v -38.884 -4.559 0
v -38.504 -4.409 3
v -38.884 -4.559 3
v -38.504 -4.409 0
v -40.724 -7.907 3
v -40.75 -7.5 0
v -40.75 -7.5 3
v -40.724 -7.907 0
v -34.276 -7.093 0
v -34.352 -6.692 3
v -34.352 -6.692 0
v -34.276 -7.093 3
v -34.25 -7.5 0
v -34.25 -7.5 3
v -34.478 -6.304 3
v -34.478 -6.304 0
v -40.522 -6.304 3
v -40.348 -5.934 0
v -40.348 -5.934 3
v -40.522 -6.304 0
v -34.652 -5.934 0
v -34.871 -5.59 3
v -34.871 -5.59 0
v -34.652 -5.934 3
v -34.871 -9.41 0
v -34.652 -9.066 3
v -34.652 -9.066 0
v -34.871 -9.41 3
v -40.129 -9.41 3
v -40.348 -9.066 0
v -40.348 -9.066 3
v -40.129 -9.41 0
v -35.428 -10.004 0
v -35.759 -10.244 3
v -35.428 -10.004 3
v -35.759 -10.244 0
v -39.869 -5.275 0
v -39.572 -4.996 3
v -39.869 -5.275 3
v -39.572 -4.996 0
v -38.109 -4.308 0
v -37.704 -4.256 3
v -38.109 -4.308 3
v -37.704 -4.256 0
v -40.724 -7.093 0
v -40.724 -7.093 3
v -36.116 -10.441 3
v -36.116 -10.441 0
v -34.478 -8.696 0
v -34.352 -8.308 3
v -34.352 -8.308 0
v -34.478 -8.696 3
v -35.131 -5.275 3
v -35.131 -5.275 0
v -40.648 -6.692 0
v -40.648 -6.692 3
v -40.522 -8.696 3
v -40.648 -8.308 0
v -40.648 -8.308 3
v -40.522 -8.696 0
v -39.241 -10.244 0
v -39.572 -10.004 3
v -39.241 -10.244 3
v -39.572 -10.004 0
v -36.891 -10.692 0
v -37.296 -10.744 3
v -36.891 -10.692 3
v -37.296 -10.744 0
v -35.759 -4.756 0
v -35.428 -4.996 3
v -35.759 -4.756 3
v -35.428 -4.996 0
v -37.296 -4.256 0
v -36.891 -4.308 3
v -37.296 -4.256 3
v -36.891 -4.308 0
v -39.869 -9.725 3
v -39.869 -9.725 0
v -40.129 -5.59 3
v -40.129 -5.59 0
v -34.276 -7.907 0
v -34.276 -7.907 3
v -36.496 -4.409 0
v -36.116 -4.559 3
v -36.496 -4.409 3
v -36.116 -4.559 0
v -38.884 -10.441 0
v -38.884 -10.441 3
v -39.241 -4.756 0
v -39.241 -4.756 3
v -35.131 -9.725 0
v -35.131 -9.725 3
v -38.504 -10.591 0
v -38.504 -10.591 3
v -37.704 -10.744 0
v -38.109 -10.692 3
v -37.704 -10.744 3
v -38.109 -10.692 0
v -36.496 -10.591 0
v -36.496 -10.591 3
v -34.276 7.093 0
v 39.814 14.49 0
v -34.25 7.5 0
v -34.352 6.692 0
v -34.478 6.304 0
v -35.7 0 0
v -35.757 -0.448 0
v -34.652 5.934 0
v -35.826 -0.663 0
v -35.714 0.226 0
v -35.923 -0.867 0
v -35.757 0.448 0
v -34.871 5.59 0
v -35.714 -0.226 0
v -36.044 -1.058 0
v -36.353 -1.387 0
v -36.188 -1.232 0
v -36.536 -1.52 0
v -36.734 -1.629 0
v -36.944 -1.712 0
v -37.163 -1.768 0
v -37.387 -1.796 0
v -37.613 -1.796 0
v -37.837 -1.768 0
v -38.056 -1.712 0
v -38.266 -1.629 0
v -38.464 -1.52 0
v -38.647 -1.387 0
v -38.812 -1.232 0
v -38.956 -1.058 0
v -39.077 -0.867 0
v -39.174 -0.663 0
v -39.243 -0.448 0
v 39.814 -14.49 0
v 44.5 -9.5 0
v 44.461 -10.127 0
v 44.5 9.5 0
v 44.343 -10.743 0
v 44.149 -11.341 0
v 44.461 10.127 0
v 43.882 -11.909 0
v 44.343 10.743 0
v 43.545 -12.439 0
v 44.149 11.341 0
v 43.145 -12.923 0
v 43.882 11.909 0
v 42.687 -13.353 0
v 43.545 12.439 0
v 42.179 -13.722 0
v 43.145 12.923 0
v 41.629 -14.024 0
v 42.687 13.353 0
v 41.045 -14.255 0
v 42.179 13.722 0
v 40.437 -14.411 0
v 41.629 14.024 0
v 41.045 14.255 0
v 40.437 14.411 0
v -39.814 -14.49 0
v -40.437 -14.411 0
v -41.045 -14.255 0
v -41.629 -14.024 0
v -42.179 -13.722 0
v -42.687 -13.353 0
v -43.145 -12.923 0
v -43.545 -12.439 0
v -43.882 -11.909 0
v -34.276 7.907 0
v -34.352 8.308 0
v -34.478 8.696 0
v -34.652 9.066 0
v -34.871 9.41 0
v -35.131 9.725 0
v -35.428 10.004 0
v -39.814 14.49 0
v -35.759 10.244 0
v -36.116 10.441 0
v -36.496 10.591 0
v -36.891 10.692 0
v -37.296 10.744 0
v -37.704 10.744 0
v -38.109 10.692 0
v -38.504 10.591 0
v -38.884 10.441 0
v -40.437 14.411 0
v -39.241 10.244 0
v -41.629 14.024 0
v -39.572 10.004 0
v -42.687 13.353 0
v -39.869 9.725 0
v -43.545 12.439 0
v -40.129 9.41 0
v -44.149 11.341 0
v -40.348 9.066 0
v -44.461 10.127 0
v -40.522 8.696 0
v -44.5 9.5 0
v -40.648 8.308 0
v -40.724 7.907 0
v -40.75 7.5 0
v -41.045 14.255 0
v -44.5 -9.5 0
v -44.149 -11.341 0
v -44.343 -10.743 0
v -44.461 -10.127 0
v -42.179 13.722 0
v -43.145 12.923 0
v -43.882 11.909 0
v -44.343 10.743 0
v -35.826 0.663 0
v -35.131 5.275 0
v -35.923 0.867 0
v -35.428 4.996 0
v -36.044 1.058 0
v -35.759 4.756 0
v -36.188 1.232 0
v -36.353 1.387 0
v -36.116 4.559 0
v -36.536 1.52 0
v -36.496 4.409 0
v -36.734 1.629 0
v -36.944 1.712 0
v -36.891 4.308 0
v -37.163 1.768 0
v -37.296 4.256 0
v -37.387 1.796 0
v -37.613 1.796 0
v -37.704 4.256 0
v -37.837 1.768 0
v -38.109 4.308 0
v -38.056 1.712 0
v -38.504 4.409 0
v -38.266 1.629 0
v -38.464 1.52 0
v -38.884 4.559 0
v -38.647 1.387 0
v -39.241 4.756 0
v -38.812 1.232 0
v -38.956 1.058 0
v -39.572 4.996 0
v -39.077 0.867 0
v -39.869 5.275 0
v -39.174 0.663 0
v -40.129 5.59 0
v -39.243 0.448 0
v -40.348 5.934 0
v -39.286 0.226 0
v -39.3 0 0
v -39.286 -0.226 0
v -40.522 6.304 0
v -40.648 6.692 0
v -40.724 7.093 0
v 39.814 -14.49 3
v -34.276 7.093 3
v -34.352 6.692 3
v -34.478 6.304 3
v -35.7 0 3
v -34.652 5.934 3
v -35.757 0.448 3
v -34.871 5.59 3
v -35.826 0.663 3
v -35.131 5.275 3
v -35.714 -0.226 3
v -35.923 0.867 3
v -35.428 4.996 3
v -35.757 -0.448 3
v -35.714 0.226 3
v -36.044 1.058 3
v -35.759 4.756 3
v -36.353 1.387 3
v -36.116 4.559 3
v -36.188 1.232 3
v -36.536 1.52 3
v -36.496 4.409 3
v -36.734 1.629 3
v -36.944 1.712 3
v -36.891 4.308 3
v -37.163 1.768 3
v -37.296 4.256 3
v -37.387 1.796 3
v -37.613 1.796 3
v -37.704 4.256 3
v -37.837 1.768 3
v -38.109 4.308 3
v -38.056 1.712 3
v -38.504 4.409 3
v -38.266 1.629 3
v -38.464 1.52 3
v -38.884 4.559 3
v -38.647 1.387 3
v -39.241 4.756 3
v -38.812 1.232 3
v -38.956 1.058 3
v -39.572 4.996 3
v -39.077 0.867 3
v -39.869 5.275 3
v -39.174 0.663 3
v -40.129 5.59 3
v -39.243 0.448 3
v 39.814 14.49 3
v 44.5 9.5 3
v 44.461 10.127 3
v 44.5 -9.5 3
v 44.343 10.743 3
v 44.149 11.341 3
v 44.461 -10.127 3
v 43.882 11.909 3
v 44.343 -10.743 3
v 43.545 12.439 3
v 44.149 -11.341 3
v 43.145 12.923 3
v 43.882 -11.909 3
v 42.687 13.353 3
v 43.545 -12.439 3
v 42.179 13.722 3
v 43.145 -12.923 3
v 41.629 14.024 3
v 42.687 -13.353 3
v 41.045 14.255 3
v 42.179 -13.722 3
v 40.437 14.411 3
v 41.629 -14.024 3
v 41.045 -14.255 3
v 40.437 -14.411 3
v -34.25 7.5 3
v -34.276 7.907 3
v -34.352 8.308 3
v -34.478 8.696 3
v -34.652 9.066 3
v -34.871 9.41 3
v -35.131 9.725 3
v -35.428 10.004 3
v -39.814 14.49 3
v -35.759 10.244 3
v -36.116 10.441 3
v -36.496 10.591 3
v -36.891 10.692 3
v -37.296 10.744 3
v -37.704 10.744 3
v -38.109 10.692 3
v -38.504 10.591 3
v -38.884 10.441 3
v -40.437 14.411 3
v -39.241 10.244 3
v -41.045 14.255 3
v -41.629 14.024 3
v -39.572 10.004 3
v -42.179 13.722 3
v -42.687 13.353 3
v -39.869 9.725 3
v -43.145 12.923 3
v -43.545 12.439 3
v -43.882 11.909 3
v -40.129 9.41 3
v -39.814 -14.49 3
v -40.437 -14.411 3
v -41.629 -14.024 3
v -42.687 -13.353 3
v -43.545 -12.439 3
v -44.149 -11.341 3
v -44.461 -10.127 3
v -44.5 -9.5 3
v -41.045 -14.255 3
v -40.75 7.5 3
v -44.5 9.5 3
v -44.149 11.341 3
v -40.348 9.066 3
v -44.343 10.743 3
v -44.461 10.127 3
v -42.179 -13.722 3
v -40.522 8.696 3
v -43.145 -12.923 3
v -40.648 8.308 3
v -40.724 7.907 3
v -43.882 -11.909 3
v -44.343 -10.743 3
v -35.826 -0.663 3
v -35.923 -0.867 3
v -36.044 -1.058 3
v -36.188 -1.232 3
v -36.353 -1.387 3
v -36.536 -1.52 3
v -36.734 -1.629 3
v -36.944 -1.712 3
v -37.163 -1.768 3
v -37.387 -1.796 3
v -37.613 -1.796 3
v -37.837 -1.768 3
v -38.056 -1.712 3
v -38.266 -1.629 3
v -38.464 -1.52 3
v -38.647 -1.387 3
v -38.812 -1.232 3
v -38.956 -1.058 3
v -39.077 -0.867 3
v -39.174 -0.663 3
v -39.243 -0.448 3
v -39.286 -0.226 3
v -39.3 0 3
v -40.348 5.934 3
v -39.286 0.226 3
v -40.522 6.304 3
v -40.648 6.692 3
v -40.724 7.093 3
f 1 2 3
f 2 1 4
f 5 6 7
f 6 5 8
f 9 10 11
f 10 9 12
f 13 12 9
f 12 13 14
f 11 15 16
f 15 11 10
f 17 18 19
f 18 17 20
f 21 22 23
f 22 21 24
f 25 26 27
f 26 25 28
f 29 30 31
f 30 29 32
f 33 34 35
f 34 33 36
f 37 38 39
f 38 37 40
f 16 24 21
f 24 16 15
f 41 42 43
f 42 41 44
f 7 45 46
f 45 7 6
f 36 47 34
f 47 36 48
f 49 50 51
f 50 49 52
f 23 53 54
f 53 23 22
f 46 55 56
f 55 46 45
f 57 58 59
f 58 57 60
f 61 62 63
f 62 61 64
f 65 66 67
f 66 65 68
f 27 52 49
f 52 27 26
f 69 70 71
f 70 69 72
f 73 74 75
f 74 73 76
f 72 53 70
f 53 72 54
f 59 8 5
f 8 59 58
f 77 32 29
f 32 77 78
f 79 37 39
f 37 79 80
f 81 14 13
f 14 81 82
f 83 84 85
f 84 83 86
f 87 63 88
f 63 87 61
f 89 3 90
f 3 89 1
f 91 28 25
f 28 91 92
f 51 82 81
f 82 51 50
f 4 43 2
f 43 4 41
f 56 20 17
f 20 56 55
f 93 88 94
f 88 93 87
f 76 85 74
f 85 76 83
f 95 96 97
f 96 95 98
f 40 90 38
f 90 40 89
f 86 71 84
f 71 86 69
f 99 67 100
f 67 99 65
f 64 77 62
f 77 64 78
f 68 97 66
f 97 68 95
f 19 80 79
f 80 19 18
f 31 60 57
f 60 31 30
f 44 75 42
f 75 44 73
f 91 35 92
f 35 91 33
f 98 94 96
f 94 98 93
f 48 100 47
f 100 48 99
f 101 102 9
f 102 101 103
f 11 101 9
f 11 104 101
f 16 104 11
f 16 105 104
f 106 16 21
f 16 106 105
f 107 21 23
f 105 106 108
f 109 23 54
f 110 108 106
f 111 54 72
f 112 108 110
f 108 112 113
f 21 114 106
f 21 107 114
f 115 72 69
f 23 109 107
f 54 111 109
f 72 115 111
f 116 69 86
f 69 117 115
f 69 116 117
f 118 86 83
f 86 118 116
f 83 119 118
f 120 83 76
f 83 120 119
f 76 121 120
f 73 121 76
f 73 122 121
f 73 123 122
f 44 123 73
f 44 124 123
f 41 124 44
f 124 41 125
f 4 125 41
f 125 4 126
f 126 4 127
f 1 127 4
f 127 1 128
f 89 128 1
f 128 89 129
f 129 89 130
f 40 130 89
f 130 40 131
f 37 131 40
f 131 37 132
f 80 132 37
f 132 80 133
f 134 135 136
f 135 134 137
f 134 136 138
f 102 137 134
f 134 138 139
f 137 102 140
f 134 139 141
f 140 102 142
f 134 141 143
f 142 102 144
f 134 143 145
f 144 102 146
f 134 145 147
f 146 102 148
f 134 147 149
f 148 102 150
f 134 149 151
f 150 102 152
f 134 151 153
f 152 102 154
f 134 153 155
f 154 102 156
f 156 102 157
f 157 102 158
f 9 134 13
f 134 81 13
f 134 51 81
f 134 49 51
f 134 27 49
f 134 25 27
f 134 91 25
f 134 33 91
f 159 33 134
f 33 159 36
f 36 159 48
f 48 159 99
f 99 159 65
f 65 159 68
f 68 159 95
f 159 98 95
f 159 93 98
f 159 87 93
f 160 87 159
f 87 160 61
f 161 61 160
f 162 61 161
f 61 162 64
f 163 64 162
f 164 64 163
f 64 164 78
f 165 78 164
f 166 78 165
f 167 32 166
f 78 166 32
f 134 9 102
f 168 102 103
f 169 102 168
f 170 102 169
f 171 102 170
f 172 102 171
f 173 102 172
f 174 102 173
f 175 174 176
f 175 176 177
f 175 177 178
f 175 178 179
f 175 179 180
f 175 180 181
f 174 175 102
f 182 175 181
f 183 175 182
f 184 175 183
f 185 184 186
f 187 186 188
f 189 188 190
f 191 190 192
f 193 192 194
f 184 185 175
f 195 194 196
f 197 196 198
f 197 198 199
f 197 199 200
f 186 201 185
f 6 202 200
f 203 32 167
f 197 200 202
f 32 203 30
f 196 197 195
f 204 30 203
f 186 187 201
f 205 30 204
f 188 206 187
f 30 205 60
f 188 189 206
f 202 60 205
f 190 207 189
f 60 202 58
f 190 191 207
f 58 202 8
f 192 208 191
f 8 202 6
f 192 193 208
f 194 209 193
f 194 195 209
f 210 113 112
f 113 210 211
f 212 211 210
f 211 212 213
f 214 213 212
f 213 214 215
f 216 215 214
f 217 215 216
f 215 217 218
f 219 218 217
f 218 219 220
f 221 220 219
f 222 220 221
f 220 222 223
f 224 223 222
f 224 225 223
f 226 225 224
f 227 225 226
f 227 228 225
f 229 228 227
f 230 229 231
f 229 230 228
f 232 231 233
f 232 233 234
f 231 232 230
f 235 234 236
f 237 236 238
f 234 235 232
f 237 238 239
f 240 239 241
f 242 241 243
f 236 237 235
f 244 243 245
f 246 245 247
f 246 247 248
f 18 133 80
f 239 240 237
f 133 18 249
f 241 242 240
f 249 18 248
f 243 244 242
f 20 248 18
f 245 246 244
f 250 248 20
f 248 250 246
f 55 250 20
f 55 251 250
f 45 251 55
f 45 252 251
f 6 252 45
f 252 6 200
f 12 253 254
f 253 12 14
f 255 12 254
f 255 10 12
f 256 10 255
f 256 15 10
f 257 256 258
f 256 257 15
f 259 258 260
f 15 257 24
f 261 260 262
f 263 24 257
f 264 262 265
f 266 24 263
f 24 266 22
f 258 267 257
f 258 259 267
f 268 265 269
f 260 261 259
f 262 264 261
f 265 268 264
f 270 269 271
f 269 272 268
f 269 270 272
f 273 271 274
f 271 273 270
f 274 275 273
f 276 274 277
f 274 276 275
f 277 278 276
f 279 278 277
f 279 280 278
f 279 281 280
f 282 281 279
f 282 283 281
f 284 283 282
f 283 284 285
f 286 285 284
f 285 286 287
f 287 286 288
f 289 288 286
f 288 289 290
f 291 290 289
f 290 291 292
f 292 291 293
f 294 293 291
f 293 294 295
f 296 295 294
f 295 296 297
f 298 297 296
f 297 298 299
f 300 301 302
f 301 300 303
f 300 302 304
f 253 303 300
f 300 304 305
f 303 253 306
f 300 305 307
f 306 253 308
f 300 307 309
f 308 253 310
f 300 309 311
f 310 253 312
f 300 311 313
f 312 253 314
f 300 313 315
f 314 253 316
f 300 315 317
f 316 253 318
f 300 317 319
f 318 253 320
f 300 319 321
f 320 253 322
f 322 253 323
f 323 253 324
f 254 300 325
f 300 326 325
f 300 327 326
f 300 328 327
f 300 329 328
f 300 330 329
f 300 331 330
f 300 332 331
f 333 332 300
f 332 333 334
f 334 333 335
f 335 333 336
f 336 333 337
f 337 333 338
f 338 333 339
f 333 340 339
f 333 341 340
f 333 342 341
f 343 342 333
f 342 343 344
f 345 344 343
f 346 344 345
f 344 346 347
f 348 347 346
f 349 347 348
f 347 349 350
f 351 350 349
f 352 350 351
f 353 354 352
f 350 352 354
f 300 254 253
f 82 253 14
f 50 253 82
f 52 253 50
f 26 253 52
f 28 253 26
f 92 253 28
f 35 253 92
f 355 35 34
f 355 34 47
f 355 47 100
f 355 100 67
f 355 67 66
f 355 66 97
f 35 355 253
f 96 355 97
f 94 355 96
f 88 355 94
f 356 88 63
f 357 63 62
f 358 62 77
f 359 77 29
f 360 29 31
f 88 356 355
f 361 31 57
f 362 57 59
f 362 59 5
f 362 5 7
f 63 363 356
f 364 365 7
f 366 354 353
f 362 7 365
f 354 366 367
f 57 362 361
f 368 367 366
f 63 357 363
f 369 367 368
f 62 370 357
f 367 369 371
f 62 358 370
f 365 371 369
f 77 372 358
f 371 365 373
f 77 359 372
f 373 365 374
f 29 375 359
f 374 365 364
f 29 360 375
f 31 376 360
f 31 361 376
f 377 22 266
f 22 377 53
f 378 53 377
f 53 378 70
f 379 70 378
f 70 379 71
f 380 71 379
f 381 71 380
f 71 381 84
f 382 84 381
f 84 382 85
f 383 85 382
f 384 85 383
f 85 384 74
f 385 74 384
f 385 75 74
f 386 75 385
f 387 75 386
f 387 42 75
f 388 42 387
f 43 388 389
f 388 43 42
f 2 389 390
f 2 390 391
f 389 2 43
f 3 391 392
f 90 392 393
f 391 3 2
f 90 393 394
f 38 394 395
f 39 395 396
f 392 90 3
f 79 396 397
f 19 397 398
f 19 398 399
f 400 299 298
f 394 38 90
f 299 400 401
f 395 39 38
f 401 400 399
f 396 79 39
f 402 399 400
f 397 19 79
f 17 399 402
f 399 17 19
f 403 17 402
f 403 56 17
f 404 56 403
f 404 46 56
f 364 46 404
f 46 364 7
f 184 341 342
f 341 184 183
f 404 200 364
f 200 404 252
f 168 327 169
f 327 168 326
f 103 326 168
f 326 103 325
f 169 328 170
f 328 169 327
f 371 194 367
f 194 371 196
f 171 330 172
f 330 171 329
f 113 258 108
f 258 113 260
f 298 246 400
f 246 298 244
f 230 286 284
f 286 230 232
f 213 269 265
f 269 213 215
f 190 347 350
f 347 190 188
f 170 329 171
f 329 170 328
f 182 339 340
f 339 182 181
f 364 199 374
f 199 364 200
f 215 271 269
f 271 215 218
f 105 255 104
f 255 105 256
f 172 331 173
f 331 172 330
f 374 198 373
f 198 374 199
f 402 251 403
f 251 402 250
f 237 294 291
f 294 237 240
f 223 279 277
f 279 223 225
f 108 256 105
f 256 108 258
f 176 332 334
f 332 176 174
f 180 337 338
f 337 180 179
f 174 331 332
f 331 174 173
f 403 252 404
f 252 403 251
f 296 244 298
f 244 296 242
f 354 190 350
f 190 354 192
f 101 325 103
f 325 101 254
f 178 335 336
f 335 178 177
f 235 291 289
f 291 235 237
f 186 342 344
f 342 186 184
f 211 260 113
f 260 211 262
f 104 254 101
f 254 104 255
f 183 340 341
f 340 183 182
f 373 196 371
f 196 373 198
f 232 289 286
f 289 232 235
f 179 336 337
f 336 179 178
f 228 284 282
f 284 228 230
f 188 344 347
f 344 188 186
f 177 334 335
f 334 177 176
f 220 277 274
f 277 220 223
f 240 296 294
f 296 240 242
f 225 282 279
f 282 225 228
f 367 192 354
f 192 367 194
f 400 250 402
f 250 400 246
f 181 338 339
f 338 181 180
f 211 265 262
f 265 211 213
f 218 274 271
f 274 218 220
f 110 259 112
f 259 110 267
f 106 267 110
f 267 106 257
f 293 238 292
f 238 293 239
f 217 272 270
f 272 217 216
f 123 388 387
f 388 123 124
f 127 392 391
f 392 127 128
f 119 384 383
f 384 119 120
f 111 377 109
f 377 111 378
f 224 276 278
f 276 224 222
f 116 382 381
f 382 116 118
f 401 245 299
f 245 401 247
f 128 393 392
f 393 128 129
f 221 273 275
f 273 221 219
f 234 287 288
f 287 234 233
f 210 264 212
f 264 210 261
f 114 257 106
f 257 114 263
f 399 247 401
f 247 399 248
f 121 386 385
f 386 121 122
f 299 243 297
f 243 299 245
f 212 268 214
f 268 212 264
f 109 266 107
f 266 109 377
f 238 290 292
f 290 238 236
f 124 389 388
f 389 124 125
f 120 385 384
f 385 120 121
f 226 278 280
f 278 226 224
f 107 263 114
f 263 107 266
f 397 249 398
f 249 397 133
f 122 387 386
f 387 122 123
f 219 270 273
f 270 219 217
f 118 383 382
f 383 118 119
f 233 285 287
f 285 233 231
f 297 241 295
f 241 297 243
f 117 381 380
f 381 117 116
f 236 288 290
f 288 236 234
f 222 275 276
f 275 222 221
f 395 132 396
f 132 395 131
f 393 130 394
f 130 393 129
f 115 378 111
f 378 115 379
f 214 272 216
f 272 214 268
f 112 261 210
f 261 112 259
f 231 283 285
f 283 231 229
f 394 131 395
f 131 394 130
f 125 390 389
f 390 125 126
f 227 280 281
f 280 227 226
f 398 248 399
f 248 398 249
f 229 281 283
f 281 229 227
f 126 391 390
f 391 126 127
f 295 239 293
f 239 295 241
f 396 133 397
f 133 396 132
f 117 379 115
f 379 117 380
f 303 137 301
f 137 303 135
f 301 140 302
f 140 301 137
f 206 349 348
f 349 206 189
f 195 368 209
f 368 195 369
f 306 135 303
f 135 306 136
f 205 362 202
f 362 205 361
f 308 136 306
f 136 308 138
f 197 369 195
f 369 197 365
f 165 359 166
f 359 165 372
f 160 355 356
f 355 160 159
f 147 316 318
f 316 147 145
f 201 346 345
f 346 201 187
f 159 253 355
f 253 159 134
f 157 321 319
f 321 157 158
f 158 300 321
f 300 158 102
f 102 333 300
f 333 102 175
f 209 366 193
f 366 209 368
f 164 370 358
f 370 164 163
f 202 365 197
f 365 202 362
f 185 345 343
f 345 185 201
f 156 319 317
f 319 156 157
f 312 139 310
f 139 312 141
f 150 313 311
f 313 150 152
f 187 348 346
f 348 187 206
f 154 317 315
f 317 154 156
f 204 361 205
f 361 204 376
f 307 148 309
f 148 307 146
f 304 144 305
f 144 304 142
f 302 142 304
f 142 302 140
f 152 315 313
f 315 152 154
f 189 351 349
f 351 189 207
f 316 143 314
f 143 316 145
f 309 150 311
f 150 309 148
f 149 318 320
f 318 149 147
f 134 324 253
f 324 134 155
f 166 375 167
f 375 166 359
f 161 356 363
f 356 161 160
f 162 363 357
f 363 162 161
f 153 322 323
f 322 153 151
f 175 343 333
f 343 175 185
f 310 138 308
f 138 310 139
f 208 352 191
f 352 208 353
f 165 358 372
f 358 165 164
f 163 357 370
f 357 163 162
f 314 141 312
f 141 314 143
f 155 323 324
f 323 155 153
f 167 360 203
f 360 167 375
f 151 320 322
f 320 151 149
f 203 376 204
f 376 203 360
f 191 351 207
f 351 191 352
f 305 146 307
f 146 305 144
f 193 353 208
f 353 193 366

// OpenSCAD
$fn = 50;


difference() {
	union() {
		hull() {
			translate(v = [-39.5000000000, 9.5000000000, 0]) {
				cylinder(h = 3, r = 5);
			}
			translate(v = [39.5000000000, 9.5000000000, 0]) {
				cylinder(h = 3, r = 5);
			}
			translate(v = [-39.5000000000, -9.5000000000, 0]) {
				cylinder(h = 3, r = 5);
			}
			translate(v = [39.5000000000, -9.5000000000, 0]) {
				cylinder(h = 3, r = 5);
			}
		}
	}
	union() {
		translate(v = [-37.5000000000, -7.5000000000, 0]) {
			cylinder(h = 3, r = 3.2500000000);
		}
		translate(v = [-37.5000000000, 7.5000000000, 0]) {
			cylinder(h = 3, r = 3.2500000000);
		}
		translate(v = [-37.5000000000, -7.5000000000, 0]) {
			cylinder(h = 3, r = 1.8000000000);
		}
		translate(v = [-37.5000000000, 0.0000000000, 0]) {
			cylinder(h = 3, r = 1.8000000000);
		}
		translate(v = [-37.5000000000, 7.5000000000, 0]) {
			cylinder(h = 3, r = 1.8000000000);
		}
		translate(v = [-37.5000000000, -7.5000000000, 0]) {
			cylinder(h = 3, r = 1.8000000000);
		}
		translate(v = [-37.5000000000, 0.0000000000, 0]) {
			cylinder(h = 3, r = 1.8000000000);
		}
		translate(v = [-37.5000000000, 7.5000000000, 0]) {
			cylinder(h = 3, r = 1.8000000000);
		}
		translate(v = [-37.5000000000, -7.5000000000, 0]) {
			cylinder(h = 3, r = 1.8000000000);
		}
		translate(v = [-37.5000000000, 0.0000000000, 0]) {
			cylinder(h = 3, r = 1.8000000000);
		}
		translate(v = [-37.5000000000, 7.5000000000, 0]) {
			cylinder(h = 3, r = 1.8000000000);
		}
	}
}
